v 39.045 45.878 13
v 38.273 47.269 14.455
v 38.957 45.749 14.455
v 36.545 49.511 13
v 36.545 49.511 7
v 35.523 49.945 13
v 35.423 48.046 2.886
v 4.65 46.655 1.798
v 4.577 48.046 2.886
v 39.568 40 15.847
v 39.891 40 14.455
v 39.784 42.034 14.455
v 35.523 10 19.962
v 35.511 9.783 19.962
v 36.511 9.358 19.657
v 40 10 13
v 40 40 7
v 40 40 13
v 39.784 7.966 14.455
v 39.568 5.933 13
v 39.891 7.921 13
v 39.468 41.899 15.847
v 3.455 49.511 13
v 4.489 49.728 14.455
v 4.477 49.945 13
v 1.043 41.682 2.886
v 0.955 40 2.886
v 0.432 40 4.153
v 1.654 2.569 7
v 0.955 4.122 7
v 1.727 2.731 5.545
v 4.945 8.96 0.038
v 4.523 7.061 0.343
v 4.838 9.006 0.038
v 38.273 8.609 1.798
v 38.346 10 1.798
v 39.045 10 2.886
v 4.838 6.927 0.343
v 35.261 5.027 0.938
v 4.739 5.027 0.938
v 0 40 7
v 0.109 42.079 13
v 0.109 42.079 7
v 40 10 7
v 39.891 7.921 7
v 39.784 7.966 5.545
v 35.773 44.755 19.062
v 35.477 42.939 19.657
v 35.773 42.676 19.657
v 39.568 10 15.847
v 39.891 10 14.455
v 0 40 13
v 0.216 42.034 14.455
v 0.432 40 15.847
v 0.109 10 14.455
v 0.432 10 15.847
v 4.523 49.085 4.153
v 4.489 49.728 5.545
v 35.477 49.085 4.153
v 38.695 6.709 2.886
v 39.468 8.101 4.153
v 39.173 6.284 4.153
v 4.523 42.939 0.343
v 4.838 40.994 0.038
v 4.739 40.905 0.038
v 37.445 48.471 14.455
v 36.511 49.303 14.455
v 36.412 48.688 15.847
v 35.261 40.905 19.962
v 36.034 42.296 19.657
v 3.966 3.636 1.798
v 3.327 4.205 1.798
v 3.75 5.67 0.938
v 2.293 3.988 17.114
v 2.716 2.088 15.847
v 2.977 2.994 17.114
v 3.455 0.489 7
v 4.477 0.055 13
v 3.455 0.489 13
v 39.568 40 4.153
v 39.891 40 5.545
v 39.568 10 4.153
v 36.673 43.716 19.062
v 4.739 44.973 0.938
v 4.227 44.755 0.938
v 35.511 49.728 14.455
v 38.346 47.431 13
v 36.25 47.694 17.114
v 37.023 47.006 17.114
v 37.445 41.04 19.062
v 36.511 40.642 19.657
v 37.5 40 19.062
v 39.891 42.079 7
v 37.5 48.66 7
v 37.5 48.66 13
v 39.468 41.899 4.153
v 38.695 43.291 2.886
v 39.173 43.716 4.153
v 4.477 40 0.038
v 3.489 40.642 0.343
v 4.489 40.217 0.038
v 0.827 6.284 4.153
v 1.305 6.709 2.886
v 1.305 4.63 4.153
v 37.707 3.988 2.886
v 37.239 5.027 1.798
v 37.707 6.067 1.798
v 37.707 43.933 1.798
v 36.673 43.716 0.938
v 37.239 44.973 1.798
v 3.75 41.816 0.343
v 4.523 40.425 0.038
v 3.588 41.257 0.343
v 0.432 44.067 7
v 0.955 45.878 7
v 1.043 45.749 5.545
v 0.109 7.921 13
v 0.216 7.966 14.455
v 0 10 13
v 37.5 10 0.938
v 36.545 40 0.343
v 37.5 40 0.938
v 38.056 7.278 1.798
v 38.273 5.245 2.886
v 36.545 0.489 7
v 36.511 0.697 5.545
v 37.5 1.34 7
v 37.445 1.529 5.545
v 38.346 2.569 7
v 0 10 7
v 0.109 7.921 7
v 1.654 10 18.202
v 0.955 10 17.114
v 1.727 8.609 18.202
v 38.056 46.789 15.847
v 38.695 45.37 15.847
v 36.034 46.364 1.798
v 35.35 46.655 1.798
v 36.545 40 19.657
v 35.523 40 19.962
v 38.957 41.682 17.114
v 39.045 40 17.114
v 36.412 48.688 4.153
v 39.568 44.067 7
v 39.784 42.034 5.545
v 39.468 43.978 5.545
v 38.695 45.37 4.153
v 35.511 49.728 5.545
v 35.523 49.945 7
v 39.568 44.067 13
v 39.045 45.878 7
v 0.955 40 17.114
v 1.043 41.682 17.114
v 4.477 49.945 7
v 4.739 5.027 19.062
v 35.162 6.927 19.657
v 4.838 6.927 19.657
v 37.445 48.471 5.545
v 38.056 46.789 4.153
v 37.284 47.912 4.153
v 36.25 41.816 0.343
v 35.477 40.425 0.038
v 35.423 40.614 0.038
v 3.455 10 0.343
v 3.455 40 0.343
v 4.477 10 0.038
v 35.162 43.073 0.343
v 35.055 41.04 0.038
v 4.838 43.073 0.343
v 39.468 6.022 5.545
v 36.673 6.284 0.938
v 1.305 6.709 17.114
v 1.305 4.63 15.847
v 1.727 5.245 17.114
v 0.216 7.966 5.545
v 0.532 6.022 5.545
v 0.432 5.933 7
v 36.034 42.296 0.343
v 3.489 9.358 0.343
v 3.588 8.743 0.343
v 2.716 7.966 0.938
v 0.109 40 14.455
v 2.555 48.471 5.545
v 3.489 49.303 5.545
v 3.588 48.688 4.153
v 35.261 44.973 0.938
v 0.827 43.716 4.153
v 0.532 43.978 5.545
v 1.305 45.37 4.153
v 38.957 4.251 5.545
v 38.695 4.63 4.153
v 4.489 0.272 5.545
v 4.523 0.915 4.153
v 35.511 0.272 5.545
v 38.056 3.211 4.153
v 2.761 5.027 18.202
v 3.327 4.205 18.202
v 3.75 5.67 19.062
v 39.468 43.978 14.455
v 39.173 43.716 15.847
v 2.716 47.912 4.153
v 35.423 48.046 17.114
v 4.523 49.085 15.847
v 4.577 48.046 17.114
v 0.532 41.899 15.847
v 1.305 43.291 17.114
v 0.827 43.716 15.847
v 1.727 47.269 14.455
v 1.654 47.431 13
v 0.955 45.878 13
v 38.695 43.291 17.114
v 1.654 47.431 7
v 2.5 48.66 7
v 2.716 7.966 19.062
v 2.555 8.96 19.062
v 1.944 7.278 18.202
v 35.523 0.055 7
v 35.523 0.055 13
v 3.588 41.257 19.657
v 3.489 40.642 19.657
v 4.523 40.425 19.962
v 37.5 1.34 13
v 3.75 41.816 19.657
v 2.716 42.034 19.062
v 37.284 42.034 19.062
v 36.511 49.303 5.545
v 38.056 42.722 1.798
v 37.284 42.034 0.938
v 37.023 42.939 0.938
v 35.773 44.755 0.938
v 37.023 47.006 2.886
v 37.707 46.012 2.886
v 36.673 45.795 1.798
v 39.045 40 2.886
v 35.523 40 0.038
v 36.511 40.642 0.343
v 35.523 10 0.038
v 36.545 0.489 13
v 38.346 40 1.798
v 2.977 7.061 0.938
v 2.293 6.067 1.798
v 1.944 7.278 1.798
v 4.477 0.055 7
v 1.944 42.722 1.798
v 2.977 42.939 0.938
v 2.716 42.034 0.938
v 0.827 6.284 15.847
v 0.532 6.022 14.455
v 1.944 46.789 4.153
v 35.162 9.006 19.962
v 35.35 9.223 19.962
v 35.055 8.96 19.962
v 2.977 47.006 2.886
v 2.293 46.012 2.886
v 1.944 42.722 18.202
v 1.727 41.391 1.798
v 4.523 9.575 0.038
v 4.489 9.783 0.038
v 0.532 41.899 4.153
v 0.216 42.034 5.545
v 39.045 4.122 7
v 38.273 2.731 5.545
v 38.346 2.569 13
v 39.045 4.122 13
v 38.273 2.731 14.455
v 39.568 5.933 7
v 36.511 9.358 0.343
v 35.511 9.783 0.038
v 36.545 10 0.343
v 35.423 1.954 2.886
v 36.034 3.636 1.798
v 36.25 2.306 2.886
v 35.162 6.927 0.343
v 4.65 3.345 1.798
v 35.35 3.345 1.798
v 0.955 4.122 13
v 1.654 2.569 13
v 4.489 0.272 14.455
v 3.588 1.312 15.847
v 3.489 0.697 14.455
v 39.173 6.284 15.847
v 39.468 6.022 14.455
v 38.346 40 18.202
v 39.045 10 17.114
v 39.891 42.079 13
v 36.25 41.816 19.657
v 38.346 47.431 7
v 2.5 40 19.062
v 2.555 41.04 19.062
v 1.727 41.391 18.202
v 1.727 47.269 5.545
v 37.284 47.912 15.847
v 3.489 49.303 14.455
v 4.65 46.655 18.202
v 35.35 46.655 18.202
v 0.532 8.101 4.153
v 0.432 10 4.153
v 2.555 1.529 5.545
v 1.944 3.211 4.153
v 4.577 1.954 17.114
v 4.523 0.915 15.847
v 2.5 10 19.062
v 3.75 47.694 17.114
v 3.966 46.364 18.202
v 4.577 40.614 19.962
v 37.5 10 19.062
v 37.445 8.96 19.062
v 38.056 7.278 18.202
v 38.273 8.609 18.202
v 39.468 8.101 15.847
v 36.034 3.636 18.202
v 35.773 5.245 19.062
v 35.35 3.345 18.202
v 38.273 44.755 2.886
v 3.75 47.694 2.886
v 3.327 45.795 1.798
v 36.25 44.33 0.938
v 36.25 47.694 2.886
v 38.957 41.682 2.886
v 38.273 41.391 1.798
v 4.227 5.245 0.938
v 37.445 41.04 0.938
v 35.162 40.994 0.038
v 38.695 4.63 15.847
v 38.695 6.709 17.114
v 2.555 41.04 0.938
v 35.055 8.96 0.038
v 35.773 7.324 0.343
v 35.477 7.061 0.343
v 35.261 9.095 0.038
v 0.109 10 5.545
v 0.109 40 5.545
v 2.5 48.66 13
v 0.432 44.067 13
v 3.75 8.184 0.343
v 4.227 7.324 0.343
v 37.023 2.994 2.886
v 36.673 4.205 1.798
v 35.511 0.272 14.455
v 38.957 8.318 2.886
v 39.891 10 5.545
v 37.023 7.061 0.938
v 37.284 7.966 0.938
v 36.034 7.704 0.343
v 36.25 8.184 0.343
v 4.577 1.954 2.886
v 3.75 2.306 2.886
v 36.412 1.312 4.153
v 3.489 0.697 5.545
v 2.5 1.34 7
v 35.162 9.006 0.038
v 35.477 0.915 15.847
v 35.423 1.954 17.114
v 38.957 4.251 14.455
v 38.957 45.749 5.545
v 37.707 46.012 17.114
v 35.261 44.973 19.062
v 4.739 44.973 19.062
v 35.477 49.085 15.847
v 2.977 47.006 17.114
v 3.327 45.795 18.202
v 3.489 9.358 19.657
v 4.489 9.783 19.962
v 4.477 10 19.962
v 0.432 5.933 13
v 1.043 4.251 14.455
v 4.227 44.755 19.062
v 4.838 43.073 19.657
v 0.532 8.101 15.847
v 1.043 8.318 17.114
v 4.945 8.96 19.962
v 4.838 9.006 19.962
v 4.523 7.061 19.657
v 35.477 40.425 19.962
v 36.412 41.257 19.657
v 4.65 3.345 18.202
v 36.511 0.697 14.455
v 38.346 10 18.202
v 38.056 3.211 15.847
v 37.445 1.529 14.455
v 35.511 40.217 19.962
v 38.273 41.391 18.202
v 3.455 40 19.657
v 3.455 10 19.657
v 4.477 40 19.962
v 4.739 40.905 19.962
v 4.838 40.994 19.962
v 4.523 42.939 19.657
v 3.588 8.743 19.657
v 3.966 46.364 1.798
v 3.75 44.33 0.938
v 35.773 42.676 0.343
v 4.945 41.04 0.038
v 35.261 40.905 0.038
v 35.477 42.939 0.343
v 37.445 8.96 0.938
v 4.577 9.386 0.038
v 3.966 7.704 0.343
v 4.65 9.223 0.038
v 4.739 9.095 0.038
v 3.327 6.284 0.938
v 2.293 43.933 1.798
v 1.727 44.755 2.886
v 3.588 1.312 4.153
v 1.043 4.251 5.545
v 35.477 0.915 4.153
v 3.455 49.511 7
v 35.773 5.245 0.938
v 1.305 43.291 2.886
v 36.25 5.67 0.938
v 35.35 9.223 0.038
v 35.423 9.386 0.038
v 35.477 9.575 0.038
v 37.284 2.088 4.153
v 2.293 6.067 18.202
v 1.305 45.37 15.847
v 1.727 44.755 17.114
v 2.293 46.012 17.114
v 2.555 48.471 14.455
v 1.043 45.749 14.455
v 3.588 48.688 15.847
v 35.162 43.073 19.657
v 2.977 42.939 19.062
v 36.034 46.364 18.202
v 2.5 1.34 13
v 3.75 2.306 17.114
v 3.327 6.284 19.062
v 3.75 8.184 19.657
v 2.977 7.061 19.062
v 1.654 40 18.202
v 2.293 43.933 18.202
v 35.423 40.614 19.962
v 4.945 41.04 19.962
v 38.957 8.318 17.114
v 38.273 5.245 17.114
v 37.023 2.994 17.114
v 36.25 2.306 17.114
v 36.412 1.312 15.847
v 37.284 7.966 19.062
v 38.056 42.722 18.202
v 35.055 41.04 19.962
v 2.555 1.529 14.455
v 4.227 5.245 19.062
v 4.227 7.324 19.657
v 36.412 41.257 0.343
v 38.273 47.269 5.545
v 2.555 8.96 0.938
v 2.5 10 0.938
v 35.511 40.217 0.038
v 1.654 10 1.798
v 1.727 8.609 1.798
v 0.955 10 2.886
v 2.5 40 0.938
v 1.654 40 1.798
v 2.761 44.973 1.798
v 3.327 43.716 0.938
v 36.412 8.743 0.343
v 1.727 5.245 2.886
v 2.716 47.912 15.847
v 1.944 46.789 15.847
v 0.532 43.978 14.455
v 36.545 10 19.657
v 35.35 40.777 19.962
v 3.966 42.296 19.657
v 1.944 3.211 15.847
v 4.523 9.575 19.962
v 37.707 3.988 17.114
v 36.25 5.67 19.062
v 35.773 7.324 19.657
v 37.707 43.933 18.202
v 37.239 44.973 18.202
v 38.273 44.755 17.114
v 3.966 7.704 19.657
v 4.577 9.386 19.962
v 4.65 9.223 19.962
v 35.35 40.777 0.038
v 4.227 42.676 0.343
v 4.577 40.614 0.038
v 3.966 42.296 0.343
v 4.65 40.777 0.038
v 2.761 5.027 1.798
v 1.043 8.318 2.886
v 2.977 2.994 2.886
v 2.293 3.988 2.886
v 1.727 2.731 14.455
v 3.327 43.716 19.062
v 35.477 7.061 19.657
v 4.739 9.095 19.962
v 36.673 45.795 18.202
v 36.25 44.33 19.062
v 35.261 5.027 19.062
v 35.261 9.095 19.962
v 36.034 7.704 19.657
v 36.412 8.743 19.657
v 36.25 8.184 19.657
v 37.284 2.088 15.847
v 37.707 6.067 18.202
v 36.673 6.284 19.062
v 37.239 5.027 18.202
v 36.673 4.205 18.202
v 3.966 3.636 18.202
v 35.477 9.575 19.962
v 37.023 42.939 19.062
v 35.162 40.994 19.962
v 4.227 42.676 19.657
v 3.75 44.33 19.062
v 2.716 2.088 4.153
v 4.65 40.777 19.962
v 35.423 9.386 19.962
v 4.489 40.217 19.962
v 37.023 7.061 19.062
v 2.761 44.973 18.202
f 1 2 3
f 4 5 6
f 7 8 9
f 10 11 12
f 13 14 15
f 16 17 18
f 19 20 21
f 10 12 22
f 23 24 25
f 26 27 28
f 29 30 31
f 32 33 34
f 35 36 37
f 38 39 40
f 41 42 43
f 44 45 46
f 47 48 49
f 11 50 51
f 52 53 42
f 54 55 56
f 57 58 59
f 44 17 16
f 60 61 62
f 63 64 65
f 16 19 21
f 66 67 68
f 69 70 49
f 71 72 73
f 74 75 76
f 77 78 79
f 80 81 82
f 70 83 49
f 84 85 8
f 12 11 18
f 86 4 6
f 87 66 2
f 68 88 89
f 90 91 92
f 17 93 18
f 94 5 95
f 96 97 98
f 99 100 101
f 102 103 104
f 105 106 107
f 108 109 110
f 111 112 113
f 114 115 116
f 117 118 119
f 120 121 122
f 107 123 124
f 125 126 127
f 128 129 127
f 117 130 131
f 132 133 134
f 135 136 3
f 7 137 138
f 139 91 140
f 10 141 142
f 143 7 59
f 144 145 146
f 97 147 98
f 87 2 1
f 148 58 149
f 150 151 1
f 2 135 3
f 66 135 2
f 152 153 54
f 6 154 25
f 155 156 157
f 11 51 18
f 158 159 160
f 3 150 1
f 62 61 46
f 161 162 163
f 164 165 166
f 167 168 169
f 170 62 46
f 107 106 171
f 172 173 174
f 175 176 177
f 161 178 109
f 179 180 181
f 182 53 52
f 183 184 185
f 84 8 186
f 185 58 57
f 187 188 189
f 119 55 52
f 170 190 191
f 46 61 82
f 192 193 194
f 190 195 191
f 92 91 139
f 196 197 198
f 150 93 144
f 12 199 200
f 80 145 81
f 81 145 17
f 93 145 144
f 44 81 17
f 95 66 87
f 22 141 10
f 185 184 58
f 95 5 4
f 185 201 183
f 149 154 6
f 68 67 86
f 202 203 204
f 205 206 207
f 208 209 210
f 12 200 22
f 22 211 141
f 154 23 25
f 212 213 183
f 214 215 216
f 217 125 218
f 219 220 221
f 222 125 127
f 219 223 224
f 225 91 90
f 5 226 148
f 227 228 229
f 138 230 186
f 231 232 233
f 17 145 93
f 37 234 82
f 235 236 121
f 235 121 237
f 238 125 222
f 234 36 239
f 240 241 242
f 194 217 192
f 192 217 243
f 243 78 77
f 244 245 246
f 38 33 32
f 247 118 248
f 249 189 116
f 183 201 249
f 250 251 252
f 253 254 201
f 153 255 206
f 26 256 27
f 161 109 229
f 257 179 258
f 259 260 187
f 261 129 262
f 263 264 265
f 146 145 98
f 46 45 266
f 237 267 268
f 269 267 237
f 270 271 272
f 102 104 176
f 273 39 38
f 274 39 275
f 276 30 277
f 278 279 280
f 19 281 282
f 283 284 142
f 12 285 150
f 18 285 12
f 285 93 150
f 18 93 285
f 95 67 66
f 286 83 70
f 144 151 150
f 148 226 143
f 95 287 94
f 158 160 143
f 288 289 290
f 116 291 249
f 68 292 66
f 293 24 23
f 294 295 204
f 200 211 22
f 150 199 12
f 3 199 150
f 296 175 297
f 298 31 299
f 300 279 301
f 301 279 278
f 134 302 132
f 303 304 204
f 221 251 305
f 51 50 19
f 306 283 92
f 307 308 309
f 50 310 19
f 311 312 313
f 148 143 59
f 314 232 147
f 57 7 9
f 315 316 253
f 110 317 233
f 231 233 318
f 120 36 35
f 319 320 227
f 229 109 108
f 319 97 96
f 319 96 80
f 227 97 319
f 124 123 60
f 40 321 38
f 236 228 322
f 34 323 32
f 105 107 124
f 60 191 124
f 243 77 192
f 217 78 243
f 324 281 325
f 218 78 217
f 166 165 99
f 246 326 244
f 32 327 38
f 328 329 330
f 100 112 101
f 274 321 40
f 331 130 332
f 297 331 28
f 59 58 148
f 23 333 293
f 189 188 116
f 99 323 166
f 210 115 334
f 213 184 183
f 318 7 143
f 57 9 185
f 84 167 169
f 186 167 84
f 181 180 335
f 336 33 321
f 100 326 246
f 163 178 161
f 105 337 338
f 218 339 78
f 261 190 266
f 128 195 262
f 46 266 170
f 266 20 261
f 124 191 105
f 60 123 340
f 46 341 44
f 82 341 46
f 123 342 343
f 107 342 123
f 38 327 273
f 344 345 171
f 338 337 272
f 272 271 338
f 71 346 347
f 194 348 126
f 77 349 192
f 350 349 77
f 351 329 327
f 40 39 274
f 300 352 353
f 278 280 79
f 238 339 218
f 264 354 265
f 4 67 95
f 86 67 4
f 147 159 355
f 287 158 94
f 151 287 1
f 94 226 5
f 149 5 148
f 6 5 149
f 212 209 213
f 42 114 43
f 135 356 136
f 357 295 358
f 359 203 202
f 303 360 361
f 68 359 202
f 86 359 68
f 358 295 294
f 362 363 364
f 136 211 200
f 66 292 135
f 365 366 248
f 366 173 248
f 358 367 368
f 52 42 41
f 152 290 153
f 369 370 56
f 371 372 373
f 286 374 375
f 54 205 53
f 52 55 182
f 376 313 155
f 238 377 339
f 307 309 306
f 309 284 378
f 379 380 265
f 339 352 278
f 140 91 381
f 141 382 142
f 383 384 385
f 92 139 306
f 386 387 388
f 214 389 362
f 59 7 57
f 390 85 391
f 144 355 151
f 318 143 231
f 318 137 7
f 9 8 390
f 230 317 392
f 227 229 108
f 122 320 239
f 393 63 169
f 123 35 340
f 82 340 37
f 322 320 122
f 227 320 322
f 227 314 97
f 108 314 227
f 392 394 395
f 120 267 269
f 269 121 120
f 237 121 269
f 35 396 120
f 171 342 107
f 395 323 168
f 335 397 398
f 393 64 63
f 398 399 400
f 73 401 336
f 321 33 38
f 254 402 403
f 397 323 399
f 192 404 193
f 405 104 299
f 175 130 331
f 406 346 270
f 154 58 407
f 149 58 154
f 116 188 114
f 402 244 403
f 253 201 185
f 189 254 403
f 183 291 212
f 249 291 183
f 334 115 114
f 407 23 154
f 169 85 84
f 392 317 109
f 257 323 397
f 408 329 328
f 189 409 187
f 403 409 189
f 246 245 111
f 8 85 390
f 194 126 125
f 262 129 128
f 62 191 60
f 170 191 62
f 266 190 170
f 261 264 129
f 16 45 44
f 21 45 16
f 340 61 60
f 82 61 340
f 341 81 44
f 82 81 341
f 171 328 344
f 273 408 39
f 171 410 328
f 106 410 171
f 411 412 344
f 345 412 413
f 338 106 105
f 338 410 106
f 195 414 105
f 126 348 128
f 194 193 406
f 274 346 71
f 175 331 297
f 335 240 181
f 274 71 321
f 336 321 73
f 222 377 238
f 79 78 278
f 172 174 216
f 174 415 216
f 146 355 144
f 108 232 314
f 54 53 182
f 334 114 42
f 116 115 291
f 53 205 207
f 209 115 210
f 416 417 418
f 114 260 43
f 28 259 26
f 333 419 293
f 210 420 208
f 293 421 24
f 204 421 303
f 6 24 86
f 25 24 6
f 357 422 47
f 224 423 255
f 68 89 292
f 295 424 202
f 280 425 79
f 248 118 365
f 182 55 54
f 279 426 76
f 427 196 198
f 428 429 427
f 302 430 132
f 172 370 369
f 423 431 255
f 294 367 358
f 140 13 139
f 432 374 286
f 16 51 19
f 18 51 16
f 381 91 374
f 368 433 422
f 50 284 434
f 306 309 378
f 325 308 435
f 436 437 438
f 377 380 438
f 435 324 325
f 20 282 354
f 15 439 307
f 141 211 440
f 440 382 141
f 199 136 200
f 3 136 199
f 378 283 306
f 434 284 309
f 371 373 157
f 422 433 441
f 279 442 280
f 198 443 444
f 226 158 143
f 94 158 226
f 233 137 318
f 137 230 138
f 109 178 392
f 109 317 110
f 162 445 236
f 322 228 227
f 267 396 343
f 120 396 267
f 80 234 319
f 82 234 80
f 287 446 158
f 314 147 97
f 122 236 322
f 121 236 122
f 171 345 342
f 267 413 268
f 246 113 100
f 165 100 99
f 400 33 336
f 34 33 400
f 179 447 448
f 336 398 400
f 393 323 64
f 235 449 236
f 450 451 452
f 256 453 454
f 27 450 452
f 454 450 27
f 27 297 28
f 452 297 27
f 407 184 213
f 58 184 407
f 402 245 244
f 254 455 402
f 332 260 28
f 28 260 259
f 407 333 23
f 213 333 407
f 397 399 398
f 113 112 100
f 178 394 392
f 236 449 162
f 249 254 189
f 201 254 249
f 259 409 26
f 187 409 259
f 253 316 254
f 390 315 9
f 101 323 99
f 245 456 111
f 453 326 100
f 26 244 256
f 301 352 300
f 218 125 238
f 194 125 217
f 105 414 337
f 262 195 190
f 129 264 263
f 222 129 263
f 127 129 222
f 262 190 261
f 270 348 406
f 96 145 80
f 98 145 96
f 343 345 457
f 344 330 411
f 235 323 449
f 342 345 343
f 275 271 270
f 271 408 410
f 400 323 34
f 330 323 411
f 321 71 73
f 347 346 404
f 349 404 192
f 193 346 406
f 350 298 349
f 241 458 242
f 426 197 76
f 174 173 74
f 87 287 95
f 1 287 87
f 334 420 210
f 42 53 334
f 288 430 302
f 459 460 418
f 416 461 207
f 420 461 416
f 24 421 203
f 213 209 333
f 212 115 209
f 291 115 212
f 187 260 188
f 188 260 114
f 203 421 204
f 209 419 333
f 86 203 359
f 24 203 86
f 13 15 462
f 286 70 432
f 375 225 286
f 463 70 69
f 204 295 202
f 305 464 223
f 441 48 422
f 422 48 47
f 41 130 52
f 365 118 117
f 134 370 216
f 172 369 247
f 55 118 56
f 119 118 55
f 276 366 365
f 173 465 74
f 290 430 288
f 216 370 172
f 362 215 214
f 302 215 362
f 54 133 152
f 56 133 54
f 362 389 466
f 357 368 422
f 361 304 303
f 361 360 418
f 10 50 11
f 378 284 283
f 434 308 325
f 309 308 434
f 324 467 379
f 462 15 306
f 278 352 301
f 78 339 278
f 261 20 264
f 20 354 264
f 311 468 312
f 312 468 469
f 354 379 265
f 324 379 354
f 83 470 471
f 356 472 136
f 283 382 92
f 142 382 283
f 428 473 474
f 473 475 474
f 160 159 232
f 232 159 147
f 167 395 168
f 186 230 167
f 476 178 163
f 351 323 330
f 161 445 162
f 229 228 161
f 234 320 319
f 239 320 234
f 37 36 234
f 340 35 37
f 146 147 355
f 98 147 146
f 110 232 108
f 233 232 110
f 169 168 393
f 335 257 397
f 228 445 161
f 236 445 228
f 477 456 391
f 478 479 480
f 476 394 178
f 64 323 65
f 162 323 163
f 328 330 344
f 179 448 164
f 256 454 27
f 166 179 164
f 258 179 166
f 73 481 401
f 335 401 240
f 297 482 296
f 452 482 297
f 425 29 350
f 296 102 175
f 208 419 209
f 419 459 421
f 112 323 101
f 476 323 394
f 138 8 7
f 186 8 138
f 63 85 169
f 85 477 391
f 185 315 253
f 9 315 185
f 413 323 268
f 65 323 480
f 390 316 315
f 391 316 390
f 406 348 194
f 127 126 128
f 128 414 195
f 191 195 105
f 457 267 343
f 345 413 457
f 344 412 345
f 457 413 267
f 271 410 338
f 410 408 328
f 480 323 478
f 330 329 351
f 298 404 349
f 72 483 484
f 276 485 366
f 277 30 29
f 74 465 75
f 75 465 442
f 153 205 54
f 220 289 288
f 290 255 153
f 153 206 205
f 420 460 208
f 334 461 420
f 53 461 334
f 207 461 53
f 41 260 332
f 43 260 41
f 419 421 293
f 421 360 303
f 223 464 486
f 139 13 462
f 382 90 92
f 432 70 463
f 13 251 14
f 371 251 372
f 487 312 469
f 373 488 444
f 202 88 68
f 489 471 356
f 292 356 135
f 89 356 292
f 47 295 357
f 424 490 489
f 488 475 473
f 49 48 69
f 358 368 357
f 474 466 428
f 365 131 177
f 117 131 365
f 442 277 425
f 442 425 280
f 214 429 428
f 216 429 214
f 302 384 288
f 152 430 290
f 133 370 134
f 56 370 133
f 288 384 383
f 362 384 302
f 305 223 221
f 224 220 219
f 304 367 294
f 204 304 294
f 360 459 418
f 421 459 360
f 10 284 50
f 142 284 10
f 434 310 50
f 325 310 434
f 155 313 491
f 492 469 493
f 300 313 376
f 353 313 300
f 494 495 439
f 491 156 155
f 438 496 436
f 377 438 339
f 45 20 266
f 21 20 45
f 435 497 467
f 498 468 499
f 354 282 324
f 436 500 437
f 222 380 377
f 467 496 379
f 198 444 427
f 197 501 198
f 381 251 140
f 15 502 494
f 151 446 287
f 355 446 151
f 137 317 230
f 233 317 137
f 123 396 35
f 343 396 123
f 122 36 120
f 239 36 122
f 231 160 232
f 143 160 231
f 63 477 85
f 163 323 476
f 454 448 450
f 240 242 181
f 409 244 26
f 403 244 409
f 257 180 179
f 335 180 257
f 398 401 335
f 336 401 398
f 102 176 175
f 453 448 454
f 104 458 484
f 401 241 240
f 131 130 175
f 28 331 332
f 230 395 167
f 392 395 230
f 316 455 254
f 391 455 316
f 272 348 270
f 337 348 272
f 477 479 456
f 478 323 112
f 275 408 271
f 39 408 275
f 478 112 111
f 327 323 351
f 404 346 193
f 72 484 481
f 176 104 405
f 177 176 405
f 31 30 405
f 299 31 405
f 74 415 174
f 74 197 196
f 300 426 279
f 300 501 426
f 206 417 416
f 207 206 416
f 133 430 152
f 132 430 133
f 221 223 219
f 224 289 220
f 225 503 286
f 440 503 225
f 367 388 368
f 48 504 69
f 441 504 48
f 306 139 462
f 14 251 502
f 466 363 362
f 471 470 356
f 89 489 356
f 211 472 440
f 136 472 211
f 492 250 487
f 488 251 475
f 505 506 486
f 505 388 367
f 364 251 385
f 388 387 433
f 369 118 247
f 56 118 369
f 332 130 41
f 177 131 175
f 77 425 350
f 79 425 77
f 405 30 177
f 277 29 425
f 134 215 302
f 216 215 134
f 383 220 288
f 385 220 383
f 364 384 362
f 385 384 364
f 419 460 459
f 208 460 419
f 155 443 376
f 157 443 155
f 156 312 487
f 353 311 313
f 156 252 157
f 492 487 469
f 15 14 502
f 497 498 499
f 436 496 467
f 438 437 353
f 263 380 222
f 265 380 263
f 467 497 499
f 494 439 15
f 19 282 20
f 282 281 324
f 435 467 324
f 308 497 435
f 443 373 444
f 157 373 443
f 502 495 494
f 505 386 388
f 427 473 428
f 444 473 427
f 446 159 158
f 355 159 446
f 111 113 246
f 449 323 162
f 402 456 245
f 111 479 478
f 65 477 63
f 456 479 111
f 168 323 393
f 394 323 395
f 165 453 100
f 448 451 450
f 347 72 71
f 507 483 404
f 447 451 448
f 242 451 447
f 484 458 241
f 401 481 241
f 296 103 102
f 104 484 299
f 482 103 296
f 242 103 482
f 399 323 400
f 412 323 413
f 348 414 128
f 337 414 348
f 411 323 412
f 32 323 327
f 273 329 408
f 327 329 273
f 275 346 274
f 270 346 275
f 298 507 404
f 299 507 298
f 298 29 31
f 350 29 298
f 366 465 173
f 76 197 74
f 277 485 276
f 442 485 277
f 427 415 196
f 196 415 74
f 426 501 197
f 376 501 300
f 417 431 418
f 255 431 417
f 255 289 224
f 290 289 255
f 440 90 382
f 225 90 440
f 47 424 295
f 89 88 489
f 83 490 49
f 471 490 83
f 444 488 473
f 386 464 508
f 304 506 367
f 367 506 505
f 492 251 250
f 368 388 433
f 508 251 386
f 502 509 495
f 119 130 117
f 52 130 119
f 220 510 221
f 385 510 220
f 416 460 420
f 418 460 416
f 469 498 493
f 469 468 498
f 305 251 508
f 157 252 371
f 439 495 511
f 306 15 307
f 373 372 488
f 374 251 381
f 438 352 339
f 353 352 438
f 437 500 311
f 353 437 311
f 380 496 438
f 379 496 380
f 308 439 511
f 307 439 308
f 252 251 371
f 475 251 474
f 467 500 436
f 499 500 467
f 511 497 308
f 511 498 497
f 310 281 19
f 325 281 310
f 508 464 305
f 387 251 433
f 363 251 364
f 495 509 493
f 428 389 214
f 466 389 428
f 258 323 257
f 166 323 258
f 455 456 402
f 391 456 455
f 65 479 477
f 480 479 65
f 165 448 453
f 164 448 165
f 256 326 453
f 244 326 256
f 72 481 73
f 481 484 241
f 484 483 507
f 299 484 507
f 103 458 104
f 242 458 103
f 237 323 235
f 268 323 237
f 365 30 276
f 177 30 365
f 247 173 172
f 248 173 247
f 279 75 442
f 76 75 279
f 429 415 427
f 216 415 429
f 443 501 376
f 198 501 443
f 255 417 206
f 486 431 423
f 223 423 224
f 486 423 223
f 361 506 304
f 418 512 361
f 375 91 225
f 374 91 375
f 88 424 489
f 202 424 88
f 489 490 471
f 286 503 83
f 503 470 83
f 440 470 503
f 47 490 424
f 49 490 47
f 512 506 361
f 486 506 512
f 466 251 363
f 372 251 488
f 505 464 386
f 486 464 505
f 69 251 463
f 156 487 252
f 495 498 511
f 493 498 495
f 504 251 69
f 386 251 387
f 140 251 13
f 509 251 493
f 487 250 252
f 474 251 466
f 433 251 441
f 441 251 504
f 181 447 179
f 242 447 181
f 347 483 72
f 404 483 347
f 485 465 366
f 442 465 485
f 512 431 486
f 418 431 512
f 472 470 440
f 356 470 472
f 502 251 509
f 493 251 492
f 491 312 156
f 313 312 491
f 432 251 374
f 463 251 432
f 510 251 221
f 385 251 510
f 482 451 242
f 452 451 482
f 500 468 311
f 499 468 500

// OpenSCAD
/*
 *  OpenSCAD utilities 
 *
 *  by Ph.Gregoire AKA Greg Ware <greg.ware@laposte.net>
 *  
 *  Includes:
 *   - shorter macro modules to get a cube or cylinder with translation and rotation
 *   -  Due to some display defects in OpenSCAD preview (F5), some can use a small epsilon 
 *      so as to cut protruding apertures in solids
 *   - useful modules to build rounded corner cubes, triangle (wedges), etc
 *
 * History
 * Date         Author      Description
 * 2017/??/??   Ph.Gregoire Initial version(s)
 * 2018/07/18   Ph.Gregoire Rework for X5S corners
 *
 *  This work is licensed under the 
 *  Creative Commons Attribution 3.0 Unported License.
 *  To view a copy of this license, visit
 *    http://creativecommons.org/licenses/by/3.0/ 
 *  or send a letter to 
 *    Creative Commons, PO Box 1866, Mountain View, CA 94042, USA.
*/

// Thickness of supports for apertures
$_SUPPORT_THK=0.2;

// Cylinders $fn default
$_FN_CYL=32;
function GET_FN_CYL()=$_FN_CYL;

// Epsilon
$_EPSILON=0.2;
function GET_EPSILON()=$_EPSILON;

/* Simple translation */
module tr(dx,dy=0,dz=0) {
    translate([dx,dy,dz]) children();
}

/* Z-translation */
module trz(dz) {
    translate([0,0,dz]) children();
}

/* Simple rotation */
module rot(ax,ay=0,az=0) {
    rotate([ax,ay,az]) children();
}

/* Translate and rotate children */
module trrot(tx,ty,tz,ax,ay=0,az=0) {
    translate([tx,ty,tz]) rotate([ax,ay,az]) children();
}

/* translated cube */
module trcube(tx,ty,tz,dx,dy,dz,center=false) {
    translate([tx,ty,tz]) cube(size=[dx,dy,dz],center=center);
}

/* translated cube with epsilons along Z */
module trcube_eps(tx,ty,tz,dx,dy,dz) {
    translate([tx,ty,tz-$_EPSILON]) cube([dx,dy,dz+2*$_EPSILON]);
}

/* translated cylinder */
module trcyl(tx,ty,tz,d,h,center=false,fn=$_FN_CYL) {
	translate([tx,ty,tz]) cylinder(d=d,h=h,center=center,$fn=fn);
}

/* translated cone */
module trcone(tx,ty,tz,d1,d2,h,center=false,fn=$_FN_CYL) {
	translate([tx,ty,tz]) cylinder(d1=d1,d2=d2,h=h,center=center,$fn=fn);
}

/* cylinder with epsilon along Z axis */
module cyl_eps(d,h,center=false,fn=$_FN_CYL) {
    cylinder(d=d,h=h+2*$_EPSILON,center=center,$fn=fn);
}

/* translated cylinder with epsilon along height (Z) */
module trcyl_eps(tx,ty,tz,d,h,center=false,fn=$_FN_CYL) {
    translate([tx,ty,tz-$_EPSILON]) cyl_eps(d,h,center=center,fn=fn);
}

module trrotcyl(tx,ty,tz,ax,ay,az,d,h,center=false,fn=$_FN_CYL) {
	trrot(tx,ty,tz,ax,ay,az) cylinder(d=d,h=h,center=center,$fn=fn);
}

module tube(dint,dout,h,center,fn=$_FN_CYL) {
    difference() {
        cylinder(d=dout,h=h,center=center,$fn=fn);
        cylinder(d=dint,h=h,center=center,$fn=fn);
    }
}

module trrottube(tx,ty,tz,ax,ay,az,dout,dint,h,center=false,fn=$_FN_CYL) {
	trrot(tx,ty,tz,ax,ay,az) tube(dout=dout,dint=dint,h=h,center=center,$fn=fn);
}

/* translated and rotated cylinder with epsilon along height (Z) */
module trrotcyl_eps(tx,ty,tz,ax,ay,az,d,h,center=false,fn=$_FN_CYL) {
    trrot(tx,ty,tz,ax,ay,az) translate([0,0,-$_EPSILON]) cylinder(d=d,h=h+2*$_EPSILON,center=center,$fn=fn);
}

/* translated and rotated cube */
module trrotcube(tx,ty,tz,ax,ay,az,dx,dy,dz,center=false) {
    trrot(tx,ty,tz,ax,ay,az) cube([dx,dy,dz],center=center);
}

/* rotated and translated cube */
module rottrcube(tx,ty,tz,ax,ay,az,dx,dy,dz,center=false) {
    rotate([ax,ay,az]) tr(tx,ty,tz) cube([dx,dy,dz],center=center);
}

/* Translated rotate cube with diff children (in cube referential) */
module trrotcube_diff(tx,ty,tz,ax,ay,az,dx,dy,dz) {
    trrot(tx,ty,tz,ax,ay,az) difference() {
        cube([dx,dy,dz]);
        children();
    }
}

/* Box with apertures cut out from children */
module boxWithApertures(w,l,h,t) {
    // Bottom
    trcube(-w/2-t,-l/2-t,0,w+2*t,l+2*t,t);

    // sides
    for(s=[0:3]) {
        L=w*((s+1)%2)+l*(s%2)+2*t;
        P=l*((s+1)%2)+w*(s%2);
        
        rotate([0,0,s*90]) {
            translate([-L/2,P/2,t]) {
                difference() {
                    cube([L,t,h]);
                    // aperture
                    if($children>s) {
                        translate([thk,thk,0]) rotate([90,0,0]) children(s);
                    }
                }
            }
        }
    }

}

/* Make a support: remove a thin support layer from a flat shape */
module supportDiff(thk) {
    difference() {
        children(0);
        translate([0,0,thk/2]) {
            linear_extrude(height=$_SUPPORT_THK) projection() children(0);
        }
    }
}

/* Lateral vents 
    n: number of vents
    h: height of vent and vent spacing
    l: horizontal length of vent
    x: horizontal x offset of vent
    z: vertical offset of first vent
    t: thickness of panel
*/
module vents(n,h,l,x,z,t) {
    for(v=[0:n-1]) {
        trcube_eps(x,z+2*v*h,0,l,h,t);
    }
}

/* Fan vent 
    w: width of panel
    dz: height of center of fan
    df: diameter of fan
    dh: diameter of hub
    fs: Number of fan spokes
    t: thickness of panel
*/
module fanvent(w,dz,df,dh,fs,t) {
    difference() {
        // External
        trcyl_eps(w/2,dz,0,df,t);
        
        // central hub
        trcyl_eps(w/2,dz,0,dh,t);
        
        // spokes
        translate([w/2,dz,0]) {
            for(a=[0:fs-1]) {
                rotate([0,0,180+a*(360/fs)]) trcube_eps(-t/2,0,0,t,df,t);
            }
        }
    }
}
/* Fan mounting holes
    w: Width of panel
    dz: height of center of fan
    wfh: width of fan holes
    dfh: diameter of fan holes
    t: thickness of panel
*/
module fanholes(w,dz,wfh,dfh,t) {
    for(x=[-1,1]) {
        for(y=[-1,1]) {
            trcyl_eps(w/2+wfh/2*x,dz+wfh/2*y,0,dfh,t);
        }
    }
}

/* Position children in one corner of box, using a centered box */
module cornerPos(w,l,h,x,y,center=true) {
    translate([center?x*w/2:(x+1)*w/2,center?y*l/2:(y+1)*l/2,h]) {
        if(x==-1 && y==-1) children();
        if(x==1 && y==-1) rotate([0,0,90]) children();
        if(x==1 && y==1) rotate([0,0,180]) children();
        if(x==-1 && y==1) rotate([0,0,270]) children();
    }
}

/* Position children at each 4 corners of centered cube */ 
module cornersPos(w,l,h=0,center=true) {
 for(x=[-1,1]) {
        for(y=[-1,1]) {
            cornerPos(w,l,h,x,y,center=center) children();
        }
    }
}


/* Quarter Cone */
module quarterCone(r1,r2,h) {
    intersection() {
        cylinder(r1=r2,r2=r1,h=h);
        cube([r1>r2?r1:r2,r1>r2?r1:r2,h]);
    }
}

module quarterCyl(r,h) {
    intersection() {
        cylinder(r=r,h=h,$fn=$_FN_CYL);
        cube([r,r,h]);
    }
}

/* Corner rounding */
module champfer(rounding,h) {
    difference() {
        translate([-$_EPSILON,-$_EPSILON,-$_EPSILON])
            cube([rounding+$_EPSILON,rounding+$_EPSILON,h+2*$_EPSILON]);
        translate([rounding,rounding])
            cylinder(r=rounding,h=h);
    }
}

/* Triangle by extrusion. the a parameter is the rotation angle */
module triangle(dx,dy,h,a=0) {
    if(a<0) triangle(dx,dy,h,a=a+360);
    else {
        a=a%360;
        linear_extrude(height=h) {
            if(a<90) polygon(points=[[0,0],[dx,0],[0,dy],[0,0]]);
            else if(a<180) polygon(points=[[0,0],[dx,dy],[dx,0],[0,0]]);
            else if(a<270) polygon(points=[[dx,dy],[0,dy],[dx,0],[dx,dy]]);
            else if(a<360) polygon(points=[[0,0],[dx,dy],[0,dy],[0,0]]);
        }
    }
}

module roundedFlatBox(dx,dy,h,r,center=false) {
    translate([center?r-dx/2:r,center?r-dy/2:r]) 
    linear_extrude(height=h)
    offset(r=r)
    square([dx-2*r,dy-2*r]);
}

module roundedBoundingBox(dx,dy,dz,rx,ry,rz) {
    minkowski() {
        trcube(rx,ry,rz,dx-2*rx,dy-2*ry,dz-2*rz);
        r=max(rx,ry,rz);
        scale([rx/r,ry/r,rz/r]) sphere(r);
    }
}

test();

module test() {
    //triangle(30,20,10,270);
    //quarterCyl(5,10);
    //champfer(5,10);
    roundedBoundingBox(40,50,20,5,10,7);
}
